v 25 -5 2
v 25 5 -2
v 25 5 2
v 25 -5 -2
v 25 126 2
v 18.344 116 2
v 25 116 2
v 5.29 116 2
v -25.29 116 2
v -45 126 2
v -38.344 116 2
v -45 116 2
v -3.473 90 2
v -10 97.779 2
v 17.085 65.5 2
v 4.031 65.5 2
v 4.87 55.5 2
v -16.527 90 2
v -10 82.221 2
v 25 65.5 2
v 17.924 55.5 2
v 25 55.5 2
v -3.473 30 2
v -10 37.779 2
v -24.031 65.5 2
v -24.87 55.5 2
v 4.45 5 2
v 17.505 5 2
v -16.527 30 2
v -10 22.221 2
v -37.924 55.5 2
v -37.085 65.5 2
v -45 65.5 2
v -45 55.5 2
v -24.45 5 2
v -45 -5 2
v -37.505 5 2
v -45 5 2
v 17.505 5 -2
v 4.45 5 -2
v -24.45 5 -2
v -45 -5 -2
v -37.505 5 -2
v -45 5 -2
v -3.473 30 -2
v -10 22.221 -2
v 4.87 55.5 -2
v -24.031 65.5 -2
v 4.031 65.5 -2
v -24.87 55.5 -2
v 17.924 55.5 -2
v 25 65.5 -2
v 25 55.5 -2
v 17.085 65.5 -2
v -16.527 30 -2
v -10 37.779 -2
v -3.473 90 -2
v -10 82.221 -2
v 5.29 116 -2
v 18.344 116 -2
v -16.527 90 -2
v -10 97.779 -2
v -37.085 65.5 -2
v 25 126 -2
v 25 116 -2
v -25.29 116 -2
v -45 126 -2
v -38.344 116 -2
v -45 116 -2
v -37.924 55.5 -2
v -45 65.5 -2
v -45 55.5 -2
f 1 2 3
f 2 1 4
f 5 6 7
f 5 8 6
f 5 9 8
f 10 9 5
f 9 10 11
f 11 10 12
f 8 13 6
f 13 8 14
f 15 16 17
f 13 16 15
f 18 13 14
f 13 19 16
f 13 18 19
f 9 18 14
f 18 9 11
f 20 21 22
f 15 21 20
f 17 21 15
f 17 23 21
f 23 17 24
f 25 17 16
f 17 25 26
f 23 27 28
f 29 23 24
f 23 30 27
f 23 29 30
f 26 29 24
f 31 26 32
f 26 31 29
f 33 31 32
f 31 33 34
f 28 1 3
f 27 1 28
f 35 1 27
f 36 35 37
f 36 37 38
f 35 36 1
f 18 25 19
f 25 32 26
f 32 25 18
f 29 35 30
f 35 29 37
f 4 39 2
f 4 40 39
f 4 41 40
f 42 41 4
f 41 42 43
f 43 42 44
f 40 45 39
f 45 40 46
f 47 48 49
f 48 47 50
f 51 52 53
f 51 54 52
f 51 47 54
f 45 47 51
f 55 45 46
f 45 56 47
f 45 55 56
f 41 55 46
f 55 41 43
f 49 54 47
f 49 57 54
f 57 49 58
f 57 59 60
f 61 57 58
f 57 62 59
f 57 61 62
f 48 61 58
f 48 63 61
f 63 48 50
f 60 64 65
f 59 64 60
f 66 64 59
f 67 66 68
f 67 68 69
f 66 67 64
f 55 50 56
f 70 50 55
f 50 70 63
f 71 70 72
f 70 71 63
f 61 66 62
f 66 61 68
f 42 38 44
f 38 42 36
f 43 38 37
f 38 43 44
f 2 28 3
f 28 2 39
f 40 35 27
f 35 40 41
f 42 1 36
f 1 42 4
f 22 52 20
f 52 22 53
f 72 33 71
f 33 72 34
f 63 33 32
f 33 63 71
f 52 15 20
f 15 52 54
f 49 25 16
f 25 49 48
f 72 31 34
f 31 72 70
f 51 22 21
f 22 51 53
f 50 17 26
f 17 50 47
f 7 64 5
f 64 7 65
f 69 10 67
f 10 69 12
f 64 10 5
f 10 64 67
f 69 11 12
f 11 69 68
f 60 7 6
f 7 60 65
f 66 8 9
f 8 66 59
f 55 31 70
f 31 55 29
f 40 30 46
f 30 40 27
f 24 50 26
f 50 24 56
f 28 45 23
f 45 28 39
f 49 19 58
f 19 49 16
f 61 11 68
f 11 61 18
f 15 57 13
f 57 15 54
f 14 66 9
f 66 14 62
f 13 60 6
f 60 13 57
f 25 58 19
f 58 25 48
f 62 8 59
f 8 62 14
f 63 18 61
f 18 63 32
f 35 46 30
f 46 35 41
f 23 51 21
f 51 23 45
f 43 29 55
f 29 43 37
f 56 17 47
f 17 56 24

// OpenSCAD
translate([-10,0,0])          cube([70,10,4],true);
translate([-10,60.5,0])          cube([70,10,4],true);
translate([-10,121,0])          cube([70,10,4],true);
   translate([-10,30,0])     rotate([0,0,40])       cube([10,80,4],true);
   translate([-10,90,0])     rotate([0,0,40])       cube([10,80,4],true);
   translate([-10,90,0])     rotate([0,0,-40])       cube([10,80,4],true);
   translate([-10,30,0])     rotate([0,0,-40])       cube([10,80,4],true);
